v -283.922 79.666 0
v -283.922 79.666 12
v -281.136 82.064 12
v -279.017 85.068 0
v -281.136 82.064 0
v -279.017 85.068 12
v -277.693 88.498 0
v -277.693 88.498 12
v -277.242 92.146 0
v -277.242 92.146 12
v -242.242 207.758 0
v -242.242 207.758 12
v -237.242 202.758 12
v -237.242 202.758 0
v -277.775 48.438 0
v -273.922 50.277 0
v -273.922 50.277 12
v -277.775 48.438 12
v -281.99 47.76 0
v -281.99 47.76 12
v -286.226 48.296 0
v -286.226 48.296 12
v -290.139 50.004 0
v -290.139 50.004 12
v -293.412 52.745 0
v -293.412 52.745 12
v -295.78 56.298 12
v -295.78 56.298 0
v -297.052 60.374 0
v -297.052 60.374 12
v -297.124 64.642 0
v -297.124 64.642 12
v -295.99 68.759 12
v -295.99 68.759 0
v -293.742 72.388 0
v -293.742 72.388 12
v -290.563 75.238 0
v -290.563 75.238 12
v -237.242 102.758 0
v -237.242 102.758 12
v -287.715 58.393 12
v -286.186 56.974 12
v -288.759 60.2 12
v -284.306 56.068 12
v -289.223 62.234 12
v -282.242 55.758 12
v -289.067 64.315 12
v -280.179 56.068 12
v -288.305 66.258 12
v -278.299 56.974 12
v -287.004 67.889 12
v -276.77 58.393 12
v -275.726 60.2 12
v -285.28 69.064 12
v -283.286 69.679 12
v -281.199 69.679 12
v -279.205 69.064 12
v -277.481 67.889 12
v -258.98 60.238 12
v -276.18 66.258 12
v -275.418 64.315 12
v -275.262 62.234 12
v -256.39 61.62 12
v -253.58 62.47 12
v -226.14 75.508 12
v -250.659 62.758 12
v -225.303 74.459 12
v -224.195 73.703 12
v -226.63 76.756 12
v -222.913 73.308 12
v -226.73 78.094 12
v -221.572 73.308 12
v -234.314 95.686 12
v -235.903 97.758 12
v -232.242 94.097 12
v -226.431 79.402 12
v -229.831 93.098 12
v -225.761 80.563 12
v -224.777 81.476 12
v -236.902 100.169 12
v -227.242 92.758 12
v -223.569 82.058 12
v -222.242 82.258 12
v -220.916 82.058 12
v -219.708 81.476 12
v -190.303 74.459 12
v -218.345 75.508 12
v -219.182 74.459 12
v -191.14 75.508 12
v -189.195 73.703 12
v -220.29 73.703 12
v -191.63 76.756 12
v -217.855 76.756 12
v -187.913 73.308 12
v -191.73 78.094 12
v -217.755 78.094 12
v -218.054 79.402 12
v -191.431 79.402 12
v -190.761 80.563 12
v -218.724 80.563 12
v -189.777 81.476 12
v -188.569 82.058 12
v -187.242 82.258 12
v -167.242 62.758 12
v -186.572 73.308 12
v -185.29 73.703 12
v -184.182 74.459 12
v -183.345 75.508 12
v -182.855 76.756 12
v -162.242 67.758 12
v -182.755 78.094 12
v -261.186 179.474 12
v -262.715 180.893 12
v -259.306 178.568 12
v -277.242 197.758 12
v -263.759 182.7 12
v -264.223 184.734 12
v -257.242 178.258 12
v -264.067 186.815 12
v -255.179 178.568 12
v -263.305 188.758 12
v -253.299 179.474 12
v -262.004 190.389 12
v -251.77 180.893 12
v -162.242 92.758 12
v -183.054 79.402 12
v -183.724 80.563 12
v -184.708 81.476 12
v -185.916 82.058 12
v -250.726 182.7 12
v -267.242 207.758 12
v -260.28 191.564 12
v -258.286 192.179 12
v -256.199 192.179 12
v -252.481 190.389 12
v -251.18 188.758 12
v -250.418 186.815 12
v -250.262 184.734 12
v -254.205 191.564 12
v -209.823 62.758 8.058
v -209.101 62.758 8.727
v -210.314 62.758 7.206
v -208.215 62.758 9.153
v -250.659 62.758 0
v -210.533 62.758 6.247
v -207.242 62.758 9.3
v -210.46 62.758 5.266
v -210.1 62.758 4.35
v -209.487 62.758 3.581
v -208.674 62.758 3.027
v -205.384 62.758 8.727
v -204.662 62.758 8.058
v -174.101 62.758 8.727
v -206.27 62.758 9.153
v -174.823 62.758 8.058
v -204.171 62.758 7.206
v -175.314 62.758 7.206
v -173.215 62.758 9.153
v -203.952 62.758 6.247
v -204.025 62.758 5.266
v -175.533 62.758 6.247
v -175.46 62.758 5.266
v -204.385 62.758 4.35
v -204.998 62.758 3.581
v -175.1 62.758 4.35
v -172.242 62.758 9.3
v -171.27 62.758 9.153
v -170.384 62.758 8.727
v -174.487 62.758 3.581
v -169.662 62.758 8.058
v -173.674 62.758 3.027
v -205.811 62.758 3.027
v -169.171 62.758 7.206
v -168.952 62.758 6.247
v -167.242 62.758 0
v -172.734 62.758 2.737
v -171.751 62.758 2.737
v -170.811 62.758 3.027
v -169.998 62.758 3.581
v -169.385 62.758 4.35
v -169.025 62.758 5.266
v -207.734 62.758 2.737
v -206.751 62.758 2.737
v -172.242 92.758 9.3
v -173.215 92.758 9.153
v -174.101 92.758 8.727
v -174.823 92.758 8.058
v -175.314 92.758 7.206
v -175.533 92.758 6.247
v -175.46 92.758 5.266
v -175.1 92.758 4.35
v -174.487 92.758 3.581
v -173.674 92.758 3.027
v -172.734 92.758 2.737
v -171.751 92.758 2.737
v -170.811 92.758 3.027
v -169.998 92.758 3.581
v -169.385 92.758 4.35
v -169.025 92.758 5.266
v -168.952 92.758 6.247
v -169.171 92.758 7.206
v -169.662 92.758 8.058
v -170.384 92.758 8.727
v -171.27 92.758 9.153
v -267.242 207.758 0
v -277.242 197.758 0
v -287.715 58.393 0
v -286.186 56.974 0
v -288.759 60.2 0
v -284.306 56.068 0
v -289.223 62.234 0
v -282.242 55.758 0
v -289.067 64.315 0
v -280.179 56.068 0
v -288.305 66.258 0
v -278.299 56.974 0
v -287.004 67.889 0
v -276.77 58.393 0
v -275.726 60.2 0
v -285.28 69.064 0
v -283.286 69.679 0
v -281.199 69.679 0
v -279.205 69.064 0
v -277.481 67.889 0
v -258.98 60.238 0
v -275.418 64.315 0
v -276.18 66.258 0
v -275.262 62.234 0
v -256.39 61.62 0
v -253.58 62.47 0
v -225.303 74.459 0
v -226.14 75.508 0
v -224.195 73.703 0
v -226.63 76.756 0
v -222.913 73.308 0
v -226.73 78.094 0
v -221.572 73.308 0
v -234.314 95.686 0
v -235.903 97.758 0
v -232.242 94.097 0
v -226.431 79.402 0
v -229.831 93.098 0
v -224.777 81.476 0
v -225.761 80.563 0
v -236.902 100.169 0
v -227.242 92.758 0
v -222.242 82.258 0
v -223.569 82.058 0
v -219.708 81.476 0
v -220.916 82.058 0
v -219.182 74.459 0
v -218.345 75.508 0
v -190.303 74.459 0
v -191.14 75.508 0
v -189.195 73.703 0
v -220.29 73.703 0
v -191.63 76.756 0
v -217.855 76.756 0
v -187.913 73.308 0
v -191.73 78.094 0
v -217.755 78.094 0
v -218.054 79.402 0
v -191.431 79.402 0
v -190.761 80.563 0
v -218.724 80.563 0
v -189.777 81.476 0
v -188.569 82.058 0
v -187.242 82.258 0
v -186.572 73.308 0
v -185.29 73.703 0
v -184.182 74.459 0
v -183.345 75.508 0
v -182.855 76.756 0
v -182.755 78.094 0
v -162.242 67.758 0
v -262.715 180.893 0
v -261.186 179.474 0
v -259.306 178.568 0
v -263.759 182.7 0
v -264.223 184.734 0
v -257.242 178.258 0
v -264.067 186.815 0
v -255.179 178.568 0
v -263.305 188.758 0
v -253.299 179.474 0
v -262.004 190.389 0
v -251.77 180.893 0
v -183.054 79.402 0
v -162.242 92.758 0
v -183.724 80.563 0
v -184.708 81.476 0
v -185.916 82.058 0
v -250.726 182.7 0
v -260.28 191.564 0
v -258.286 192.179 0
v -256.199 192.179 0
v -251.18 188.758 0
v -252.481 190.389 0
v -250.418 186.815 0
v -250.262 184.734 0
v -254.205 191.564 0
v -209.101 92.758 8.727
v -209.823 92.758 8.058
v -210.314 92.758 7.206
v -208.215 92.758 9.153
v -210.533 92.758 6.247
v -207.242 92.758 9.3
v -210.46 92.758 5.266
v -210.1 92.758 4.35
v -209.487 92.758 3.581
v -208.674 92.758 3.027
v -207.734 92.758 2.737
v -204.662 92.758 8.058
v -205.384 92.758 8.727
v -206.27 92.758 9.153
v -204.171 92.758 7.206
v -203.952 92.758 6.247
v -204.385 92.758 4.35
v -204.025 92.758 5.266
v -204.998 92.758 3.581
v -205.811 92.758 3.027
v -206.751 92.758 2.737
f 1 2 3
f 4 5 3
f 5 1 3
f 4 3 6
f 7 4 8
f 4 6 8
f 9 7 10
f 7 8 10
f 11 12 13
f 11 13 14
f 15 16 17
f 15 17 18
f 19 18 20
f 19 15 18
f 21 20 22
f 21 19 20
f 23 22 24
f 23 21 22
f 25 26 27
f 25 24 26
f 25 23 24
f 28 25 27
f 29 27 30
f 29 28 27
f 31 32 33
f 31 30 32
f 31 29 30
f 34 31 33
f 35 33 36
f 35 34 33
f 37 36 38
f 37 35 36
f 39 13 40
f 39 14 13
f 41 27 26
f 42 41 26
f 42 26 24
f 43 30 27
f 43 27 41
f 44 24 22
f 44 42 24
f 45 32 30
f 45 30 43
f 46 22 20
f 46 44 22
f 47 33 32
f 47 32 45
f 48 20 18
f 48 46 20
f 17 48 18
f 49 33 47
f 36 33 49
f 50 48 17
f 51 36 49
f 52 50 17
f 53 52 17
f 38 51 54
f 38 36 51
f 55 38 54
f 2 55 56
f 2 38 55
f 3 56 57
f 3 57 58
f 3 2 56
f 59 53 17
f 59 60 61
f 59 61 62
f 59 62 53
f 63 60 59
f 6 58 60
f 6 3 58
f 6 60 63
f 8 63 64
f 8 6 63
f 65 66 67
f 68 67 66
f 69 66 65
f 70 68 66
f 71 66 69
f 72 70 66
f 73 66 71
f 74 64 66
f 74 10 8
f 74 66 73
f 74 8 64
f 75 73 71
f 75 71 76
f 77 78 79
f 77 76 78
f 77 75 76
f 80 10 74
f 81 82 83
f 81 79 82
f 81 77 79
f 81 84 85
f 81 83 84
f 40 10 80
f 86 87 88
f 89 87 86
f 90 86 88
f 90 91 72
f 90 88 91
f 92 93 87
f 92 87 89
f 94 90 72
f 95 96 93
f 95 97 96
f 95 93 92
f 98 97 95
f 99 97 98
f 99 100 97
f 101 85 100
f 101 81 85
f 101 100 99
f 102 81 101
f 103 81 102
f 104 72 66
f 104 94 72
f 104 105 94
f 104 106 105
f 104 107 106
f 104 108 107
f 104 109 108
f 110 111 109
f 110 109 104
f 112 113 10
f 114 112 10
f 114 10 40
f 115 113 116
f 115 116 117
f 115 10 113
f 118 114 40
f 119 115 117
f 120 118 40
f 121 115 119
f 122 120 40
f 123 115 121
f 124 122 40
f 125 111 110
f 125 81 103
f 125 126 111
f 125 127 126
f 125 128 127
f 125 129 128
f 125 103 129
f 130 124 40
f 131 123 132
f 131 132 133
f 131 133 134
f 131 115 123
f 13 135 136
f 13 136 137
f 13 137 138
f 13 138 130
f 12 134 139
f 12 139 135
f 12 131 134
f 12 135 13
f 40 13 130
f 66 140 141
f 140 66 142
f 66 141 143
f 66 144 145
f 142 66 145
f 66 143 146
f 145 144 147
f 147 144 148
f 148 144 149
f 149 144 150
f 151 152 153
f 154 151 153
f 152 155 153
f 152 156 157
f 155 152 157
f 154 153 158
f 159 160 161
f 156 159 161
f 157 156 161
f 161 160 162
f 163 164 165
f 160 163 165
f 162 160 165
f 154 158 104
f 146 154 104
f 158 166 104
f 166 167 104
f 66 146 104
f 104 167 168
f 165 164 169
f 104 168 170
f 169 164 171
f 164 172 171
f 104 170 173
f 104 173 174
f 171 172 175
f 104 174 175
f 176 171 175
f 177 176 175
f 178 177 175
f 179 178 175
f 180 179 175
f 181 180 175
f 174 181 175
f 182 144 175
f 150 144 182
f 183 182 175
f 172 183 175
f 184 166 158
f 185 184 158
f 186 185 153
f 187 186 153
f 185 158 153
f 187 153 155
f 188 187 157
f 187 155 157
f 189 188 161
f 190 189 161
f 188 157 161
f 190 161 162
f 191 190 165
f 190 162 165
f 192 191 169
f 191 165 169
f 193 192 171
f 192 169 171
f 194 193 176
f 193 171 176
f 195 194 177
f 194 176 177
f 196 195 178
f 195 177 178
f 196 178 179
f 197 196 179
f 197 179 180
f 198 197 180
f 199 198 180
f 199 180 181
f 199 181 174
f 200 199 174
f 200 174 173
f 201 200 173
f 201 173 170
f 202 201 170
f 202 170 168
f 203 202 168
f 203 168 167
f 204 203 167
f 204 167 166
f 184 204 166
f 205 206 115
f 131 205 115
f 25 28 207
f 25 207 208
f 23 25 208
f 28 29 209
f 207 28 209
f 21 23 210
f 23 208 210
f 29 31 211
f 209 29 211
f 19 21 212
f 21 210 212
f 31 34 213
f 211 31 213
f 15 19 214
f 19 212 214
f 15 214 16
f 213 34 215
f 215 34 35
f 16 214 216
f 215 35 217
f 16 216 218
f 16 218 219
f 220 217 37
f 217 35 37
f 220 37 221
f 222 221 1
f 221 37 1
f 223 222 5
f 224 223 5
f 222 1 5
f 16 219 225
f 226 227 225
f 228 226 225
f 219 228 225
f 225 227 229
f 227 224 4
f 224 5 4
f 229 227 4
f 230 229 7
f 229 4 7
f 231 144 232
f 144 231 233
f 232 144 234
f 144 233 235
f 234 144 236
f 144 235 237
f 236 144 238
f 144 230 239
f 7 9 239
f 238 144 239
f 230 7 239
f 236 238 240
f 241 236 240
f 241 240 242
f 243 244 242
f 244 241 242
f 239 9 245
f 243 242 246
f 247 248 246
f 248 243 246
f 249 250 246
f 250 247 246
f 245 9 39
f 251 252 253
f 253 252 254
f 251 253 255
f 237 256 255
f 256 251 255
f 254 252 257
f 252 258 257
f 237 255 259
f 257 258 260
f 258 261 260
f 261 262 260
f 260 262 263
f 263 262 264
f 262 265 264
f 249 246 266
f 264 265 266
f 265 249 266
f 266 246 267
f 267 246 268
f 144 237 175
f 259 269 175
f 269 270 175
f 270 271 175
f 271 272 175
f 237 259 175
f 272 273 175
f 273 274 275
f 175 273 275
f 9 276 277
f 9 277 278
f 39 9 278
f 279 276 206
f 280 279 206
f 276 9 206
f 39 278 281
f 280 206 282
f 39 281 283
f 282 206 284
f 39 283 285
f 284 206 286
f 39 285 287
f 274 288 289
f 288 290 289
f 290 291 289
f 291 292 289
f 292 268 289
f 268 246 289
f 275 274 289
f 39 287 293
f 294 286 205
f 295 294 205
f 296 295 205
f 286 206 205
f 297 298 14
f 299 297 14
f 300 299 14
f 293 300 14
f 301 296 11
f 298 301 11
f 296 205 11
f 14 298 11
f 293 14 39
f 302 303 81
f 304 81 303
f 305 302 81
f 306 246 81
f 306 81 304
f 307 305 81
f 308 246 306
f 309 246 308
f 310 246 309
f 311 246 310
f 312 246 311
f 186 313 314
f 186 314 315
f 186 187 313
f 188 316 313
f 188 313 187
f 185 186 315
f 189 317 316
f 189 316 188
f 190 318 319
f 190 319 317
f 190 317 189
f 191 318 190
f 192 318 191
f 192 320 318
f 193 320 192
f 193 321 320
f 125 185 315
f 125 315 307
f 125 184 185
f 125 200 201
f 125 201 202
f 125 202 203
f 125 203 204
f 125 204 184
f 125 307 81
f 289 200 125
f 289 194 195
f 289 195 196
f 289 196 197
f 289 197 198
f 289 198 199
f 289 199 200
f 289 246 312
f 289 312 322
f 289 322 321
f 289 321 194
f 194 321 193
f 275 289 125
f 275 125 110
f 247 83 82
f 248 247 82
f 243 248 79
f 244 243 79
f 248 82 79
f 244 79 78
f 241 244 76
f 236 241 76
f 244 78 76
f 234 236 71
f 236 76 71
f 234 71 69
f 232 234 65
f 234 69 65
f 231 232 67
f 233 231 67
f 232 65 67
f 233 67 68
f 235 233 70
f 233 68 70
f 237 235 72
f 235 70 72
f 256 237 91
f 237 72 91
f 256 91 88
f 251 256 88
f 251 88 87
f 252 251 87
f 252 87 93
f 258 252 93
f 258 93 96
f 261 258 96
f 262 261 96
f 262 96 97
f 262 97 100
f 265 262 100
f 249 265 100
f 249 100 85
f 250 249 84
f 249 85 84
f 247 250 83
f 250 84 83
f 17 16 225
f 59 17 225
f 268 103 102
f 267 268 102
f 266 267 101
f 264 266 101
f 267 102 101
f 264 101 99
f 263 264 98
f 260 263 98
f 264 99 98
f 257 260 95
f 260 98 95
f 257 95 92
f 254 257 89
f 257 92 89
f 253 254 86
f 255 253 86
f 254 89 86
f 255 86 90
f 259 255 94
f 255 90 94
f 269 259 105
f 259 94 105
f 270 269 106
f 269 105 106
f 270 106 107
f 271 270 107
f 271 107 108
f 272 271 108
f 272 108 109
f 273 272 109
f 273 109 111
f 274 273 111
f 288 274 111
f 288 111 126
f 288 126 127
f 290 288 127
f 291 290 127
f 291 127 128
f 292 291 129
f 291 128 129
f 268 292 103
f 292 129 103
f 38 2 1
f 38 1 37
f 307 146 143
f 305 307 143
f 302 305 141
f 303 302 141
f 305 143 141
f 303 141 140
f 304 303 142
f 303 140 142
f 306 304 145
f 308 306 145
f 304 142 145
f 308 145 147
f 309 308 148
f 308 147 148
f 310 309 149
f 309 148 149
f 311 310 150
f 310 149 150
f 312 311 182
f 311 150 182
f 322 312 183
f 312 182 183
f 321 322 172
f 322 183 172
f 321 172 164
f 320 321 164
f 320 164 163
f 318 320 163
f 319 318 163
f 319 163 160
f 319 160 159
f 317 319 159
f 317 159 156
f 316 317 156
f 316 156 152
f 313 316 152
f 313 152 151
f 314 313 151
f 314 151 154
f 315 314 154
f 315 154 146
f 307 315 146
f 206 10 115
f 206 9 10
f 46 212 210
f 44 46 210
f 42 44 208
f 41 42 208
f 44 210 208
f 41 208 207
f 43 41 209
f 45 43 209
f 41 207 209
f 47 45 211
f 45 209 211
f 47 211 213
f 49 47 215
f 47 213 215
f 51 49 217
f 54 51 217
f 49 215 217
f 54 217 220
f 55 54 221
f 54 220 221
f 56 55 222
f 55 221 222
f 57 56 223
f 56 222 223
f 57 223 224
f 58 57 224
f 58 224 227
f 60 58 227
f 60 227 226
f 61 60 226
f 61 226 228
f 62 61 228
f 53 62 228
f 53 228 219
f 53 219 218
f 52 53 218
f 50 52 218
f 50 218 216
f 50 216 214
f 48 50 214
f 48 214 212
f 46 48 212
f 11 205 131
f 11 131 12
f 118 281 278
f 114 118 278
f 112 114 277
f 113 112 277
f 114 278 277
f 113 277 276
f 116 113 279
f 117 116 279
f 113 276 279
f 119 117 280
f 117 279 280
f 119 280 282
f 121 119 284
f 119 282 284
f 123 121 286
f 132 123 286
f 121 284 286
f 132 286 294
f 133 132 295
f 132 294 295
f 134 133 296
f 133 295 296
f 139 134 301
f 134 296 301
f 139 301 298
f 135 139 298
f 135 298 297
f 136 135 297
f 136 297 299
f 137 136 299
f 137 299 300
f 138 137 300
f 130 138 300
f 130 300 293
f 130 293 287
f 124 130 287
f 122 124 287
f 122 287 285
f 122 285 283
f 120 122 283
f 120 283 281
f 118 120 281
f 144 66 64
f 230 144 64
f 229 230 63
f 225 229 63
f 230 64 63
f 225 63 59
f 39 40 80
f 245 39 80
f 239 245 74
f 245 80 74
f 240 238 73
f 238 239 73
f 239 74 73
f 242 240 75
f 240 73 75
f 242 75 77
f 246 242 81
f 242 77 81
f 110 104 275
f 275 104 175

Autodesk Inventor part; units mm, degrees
ref_plane "YZ Plane" through (0, 0, 0) normal (1, 0, 0) x (0, 1, 0)
ref_plane "XZ Plane" through (0, 0, 0) normal (0, 1, 0) x (-1, 0, 0)
sketch "スケッチ2" plane through (0, 0, 0) normal (0, 0, 1) x (1, 0, 0)
  line L0 (-162.2425, 92.7575) -> (-162.2425, 62.7575)
  line L1 (-277.2425, 207.7575) -> (-237.2425, 207.7575)
  arc A0 (-290.563, 75.2382) -> (-273.922, 50.2767) centre (-282.2425, 62.7575) ccw
  line L2 (-277.2425, 84.1186) -> (-290.563, 75.2382)
  line L3 (-277.2425, 84.1186) -> (-277.2425, 207.7575)
  line L4 (-237.2425, 207.7575) -> (-237.2425, 92.7575)
  line L5 (-237.2425, 92.7575) -> (-162.2425, 92.7575)
  line L6 (-273.922, 50.2767) -> (-255.2008, 62.7575)
  line L7 (-255.2008, 62.7575) -> (-162.2425, 62.7575)
  line L8 (-282.2425, 62.7575) -> (-237.2425, 92.7575) construction
  point P0 (0, 0)
  dimension "d18" = 120
  dimension "d21" = 15
  dimension "d116" = 5
  dimension "d154" = 15
  dimension "d155" = 145
  dimension "d175" = 30
  dimension "d181" = 90
  dimension "d182" = 40
extrude "押し出し2" add sketch "スケッチ2" along normal blind 12
sketch "スケッチ3" plane through (0, 0, 12) normal (0, 0, 1) x (1, 0, 0)
  arc A0 (-290.563, 75.2382) -> (-282.2425, 47.7575) centre (-282.2425, 62.7575) ccw projected
  line L0 (-267.2425, 207.7575) -> (-237.2425, 207.7575) projected
  point P0 (-257.2425, 185.2575)
  dimension "d16" = 25
  dimension "d153" = 22.5
hole "穴1" at (-257.2425, 185.2575, 12) at (-282.2425, 62.7575, 12) direction (0, 0, -1) diameter 14 end through all
sketch "スケッチ10" plane through (-237.2425, 92.7575, 0) normal (0, 1, 0) x (1, 0, 0)
  line L0 (75, 0) -> (75, -12)
  line L1 (0, -12) -> (75, -12)
  line L2 (75, 0) -> (0, 0) projected
  point P0 (65, -6)
  point P1 (30, -6)
  dimension "d119" = 35
  dimension "d156" = 10
  dimension "d157" = 6
hole "穴8" at (-172.2425, 92.7575, 6) at (-207.2425, 92.7575, 6) direction (0, -1, 0) diameter 6.6 end through all
chamfer "面取り1" distance 5 angle 45 1 edges at (-162.2425, 62.7575, 6)
fillet "フィレット1" radius 10 1 edges at (-237.2425, 92.7575, 6)
chamfer "面取り2" distance 5 angle 45 1 edges at (-237.2425, 207.7575, 6)
ref_plane "Work Plane2" through (-255.2008, 77.7575, 0) normal (0, -1, 0) x (1, 0, 0)
sketch "Sketch18" plane through (0, 0, 0) normal (0, 0, -1) x (-1, 0, 0)
  line L0 (162.2425, 67.7575) -> (162.2425, 92.7575) projected
  line L1 (324.2425, 77.7575) -> (135.2425, 77.7575) construction
  point P0 (187.2425, 77.7575)
  dimension "d165" = 25
hole "Hole13" at (-187.2425, 77.7575, 0) direction (0, 0, 1) diameter 9 end through all
pattern_linear "Rectangular Pattern1" count 2 spacing 35 along (-1, 0, 0) of "Hole13"
fillet "Fillet2" radius 15 2 edges at (-255.2008, 62.7575, 6) (-277.2425, 84.1186, 6)
chamfer "Chamfer3" distance 10 angle 45 1 edges at (-277.2425, 207.7575, 6)
properties part number "Support Bracket" material "STEEL - MILD"
